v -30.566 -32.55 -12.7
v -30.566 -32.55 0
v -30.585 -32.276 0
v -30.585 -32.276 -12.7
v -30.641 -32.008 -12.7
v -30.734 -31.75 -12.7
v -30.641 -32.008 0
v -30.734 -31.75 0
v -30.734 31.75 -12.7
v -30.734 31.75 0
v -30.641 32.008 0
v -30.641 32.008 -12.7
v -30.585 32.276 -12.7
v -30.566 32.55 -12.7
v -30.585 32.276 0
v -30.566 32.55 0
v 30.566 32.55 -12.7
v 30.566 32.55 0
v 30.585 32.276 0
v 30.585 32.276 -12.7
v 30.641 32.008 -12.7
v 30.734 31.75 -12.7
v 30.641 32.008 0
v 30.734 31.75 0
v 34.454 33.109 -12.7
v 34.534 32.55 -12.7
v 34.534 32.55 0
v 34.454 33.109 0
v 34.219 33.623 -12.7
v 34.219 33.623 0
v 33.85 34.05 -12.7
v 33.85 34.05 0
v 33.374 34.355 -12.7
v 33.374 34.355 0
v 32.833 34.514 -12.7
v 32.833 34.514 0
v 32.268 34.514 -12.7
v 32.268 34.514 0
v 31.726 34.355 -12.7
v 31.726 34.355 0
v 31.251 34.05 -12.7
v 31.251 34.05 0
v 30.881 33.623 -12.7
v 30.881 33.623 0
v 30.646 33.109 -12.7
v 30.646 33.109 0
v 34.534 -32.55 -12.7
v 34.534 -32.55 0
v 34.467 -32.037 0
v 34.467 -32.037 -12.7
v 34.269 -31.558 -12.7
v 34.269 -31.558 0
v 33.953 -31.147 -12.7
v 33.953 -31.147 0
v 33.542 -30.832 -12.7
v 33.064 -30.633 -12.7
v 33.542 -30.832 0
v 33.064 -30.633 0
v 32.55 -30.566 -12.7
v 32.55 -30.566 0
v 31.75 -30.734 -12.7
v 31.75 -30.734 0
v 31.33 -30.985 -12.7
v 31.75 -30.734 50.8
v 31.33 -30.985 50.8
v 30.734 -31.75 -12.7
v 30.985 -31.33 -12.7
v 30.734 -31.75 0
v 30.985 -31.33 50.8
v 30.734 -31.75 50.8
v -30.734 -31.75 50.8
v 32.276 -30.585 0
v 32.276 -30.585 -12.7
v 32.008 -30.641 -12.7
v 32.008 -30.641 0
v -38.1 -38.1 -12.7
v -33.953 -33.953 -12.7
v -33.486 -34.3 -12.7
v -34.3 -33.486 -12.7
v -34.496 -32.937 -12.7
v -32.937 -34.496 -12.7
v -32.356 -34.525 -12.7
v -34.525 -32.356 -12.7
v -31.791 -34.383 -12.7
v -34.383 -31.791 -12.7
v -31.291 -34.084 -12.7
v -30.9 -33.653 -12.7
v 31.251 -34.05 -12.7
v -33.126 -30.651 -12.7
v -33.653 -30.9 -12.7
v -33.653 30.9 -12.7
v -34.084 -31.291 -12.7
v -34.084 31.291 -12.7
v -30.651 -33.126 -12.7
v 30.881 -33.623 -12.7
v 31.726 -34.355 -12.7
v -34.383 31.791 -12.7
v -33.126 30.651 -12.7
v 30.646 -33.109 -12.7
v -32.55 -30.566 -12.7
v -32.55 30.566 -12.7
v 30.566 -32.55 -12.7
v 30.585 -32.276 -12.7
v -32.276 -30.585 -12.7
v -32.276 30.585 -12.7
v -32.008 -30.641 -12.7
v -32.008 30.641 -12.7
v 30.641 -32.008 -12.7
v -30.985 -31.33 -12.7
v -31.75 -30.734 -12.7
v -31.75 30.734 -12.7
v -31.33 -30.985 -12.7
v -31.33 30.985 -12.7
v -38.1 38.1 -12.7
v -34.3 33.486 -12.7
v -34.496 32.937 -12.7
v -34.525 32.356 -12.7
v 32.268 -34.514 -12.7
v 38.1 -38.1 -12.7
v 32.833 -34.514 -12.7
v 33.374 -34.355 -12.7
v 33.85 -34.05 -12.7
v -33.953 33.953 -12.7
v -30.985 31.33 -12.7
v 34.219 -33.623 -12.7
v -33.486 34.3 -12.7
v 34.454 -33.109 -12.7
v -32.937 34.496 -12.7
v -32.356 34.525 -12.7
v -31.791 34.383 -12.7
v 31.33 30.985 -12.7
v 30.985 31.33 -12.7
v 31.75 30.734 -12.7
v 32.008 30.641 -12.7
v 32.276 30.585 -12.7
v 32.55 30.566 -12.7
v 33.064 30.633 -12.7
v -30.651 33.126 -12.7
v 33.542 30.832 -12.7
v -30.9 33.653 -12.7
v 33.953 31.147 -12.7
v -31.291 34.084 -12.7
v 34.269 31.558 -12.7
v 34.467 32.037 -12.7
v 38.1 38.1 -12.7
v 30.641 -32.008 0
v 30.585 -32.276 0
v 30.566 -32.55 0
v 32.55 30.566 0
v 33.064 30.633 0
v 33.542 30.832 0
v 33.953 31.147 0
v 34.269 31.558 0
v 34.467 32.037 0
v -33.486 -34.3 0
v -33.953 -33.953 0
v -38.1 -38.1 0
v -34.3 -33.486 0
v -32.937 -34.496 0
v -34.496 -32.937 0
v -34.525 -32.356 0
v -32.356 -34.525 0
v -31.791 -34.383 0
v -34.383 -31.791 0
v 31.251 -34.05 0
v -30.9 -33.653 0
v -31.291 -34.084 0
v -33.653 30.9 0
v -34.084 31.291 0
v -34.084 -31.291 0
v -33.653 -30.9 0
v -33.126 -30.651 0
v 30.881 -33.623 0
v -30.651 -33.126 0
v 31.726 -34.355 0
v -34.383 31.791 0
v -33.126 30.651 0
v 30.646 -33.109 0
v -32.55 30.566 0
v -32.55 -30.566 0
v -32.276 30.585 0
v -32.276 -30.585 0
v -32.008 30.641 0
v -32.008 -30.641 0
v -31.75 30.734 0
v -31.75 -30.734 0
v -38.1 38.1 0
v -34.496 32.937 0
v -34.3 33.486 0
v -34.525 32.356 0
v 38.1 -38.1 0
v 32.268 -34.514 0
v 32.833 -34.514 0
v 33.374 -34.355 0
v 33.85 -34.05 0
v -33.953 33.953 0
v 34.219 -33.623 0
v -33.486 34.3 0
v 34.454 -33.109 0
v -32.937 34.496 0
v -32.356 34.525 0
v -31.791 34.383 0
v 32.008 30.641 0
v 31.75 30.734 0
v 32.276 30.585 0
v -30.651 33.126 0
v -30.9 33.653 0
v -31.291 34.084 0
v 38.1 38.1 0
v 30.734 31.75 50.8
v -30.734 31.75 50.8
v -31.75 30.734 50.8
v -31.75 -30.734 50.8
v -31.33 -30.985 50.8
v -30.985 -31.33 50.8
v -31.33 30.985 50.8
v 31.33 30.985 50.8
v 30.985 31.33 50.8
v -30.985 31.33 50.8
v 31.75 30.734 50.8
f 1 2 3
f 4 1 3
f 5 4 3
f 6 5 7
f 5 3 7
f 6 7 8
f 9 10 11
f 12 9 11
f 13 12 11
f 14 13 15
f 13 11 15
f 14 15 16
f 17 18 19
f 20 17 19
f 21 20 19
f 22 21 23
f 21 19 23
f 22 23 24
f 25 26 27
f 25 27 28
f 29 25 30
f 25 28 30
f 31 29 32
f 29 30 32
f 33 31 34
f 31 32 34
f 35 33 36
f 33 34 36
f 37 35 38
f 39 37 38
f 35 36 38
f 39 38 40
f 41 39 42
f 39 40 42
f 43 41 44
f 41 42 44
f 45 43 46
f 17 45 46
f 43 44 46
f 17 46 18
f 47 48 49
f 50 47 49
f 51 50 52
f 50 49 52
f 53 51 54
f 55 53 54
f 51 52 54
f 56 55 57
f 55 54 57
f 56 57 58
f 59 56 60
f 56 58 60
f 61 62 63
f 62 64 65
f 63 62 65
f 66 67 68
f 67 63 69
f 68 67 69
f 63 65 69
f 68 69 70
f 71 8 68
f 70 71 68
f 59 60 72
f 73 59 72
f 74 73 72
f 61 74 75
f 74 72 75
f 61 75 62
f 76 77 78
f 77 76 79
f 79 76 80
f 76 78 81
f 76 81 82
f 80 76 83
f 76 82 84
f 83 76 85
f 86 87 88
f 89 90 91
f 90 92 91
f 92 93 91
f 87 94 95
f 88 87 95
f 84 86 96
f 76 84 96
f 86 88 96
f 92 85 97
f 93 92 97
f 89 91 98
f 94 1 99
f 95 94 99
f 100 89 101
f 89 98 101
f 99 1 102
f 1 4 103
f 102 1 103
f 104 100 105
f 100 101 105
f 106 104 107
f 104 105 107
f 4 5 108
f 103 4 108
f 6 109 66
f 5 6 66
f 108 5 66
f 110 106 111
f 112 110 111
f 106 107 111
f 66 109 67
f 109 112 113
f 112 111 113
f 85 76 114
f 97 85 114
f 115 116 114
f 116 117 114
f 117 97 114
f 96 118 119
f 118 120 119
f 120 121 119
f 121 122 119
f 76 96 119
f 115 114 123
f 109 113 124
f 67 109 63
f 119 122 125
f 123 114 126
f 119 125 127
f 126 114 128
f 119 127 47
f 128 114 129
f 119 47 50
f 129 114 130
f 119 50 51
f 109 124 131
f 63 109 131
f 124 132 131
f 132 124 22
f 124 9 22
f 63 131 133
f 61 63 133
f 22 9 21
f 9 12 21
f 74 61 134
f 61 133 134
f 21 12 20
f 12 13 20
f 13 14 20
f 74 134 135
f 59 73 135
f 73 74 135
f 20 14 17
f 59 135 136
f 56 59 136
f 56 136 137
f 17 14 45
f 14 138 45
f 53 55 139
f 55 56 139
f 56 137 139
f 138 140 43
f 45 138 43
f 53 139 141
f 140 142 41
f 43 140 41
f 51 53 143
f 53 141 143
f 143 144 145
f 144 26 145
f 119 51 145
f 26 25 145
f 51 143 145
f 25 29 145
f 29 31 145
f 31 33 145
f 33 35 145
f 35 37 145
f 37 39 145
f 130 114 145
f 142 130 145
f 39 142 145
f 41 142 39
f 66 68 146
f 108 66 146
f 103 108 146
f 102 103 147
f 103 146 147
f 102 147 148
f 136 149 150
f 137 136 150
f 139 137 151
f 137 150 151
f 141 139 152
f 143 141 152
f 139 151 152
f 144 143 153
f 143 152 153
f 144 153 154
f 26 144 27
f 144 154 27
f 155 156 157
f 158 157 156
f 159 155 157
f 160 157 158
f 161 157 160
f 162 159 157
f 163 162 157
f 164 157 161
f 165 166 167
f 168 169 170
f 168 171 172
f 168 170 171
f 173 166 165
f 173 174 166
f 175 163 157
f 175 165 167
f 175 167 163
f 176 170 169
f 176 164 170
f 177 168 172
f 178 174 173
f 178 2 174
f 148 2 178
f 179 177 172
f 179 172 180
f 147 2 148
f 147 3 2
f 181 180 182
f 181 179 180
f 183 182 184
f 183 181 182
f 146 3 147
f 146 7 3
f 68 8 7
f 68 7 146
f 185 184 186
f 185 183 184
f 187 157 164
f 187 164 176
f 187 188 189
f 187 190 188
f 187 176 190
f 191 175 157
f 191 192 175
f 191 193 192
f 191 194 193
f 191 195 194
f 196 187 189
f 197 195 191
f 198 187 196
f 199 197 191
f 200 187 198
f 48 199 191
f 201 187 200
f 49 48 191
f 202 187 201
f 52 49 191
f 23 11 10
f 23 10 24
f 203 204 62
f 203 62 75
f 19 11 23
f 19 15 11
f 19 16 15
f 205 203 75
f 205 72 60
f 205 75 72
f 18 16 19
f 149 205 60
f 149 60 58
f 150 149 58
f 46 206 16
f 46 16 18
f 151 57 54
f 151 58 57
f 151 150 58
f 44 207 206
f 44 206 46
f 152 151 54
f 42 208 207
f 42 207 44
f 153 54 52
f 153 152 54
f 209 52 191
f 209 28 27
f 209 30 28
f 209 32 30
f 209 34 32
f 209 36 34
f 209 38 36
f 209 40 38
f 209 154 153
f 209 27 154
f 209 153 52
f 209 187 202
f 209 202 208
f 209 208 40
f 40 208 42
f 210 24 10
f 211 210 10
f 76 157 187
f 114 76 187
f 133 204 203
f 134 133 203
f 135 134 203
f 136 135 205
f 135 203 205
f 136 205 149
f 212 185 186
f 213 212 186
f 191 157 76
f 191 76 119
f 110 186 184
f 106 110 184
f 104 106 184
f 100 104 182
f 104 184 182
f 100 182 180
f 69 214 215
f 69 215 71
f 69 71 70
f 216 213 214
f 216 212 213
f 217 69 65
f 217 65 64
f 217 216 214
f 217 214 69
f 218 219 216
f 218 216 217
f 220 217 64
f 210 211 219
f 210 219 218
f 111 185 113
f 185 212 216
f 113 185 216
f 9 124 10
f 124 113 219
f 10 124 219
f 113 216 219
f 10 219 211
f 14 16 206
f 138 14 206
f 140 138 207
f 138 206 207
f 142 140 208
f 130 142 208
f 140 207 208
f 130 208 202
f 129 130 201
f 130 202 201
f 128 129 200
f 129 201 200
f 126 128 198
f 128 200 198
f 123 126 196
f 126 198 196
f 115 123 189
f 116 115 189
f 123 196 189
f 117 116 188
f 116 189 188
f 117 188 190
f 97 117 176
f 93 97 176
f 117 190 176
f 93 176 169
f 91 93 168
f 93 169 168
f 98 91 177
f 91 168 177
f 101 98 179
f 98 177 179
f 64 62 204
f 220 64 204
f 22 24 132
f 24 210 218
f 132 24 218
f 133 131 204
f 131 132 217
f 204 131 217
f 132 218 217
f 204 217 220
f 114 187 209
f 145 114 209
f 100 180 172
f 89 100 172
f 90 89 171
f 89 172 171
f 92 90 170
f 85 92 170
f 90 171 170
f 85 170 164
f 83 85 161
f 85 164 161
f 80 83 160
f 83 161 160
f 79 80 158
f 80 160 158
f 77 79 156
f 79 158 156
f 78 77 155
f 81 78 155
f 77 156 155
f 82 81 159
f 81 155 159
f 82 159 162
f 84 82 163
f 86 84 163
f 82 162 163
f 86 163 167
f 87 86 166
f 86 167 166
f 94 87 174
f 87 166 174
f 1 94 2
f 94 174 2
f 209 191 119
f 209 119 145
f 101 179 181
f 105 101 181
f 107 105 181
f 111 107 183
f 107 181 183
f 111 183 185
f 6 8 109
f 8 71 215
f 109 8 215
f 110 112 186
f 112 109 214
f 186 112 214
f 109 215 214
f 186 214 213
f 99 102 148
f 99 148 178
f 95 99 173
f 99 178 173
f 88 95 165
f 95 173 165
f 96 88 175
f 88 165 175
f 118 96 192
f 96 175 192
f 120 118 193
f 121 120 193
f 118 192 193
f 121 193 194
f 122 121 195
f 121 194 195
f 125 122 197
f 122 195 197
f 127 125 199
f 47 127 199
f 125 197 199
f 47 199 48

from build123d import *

# Parameters (mm, degrees)
F0_W     = 76.2
F0_H     = 76.2
F1_DEPTH = 12.7
F2_DEPTH = 50.8
F3_DEPTH = 12.7


with BuildPart() as f1:
    # F0 (on Top) → F1 (new body)
    with BuildSketch(Plane.XY):
        Rectangle(F0_W, F0_H)
        with BuildLine():
            Line((30.565725, -32.5501), (-30.565725, -32.5501))
            ThreePointArc((-30.565725, -32.5501), (-33.9532650189, -33.9532650189), (-32.5501, -30.565725))
            Line((-32.5501, -30.565725), (-32.5501, 30.565725))
            ThreePointArc((-32.5501, 30.565725), (-33.9532650189, 33.9532650189), (-30.565725, 32.5501))
            Line((-30.565725, 32.5501), (30.565725, 32.5501))
            ThreePointArc((30.565725, 32.5501), (32.5501, 34.534475), (34.534475, 32.5501))
            ThreePointArc((34.534475, 32.5501), (33.9532650189, 31.1469349811), (32.5501, 30.565725))
            Line((32.5501, 30.565725), (32.5501, -30.565725))
            ThreePointArc((32.5501, -30.565725), (33.9532650189, -31.1469349811), (34.534475, -32.5501))
            ThreePointArc((34.534475, -32.5501), (32.5501, -34.534475), (30.565725, -32.5501))
        make_face(mode=Mode.SUBTRACT)
        with BuildLine():
            ThreePointArc((-31.75, -30.7341748554), (-31.1469349811, -31.1469349811), (-30.7341748554, -31.75))
            Line((-30.7341748554, -31.75), (30.7341748554, -31.75))
            ThreePointArc((30.7341748554, -31.75), (31.1469349811, -31.1469349811), (31.75, -30.7341748554))
            Line((31.75, -30.7341748554), (31.75, 30.7341748554))
            ThreePointArc((31.75, 30.7341748554), (31.1469349811, 31.1469349811), (30.7341748554, 31.75))
            Line((30.7341748554, 31.75), (-30.7341748554, 31.75))
            ThreePointArc((-30.7341748554, 31.75), (-31.1469349811, 31.1469349811), (-31.75, 30.7341748554))
            Line((-31.75, 30.7341748554), (-31.75, -30.7341748554))
        make_face()
        with BuildLine():
            ThreePointArc((31.75, -30.7341748554), (32.1412799406, -30.6082940623), (32.5501, -30.565725))
            Line((32.5501, -30.565725), (32.5501, 30.565725))
            ThreePointArc((32.5501, 30.565725), (32.1412799406, 30.6082940623), (31.75, 30.7341748554))
            Line((31.75, 30.7341748554), (31.75, -30.7341748554))
        make_face()
        with BuildLine():
            ThreePointArc((-30.7341748554, -31.75), (-30.6082940623, -32.1412799406), (-30.565725, -32.5501))
            Line((-30.565725, -32.5501), (30.565725, -32.5501))
            ThreePointArc((30.565725, -32.5501), (30.6082940623, -32.1412799406), (30.7341748554, -31.75))
            Line((30.7341748554, -31.75), (-30.7341748554, -31.75))
        make_face()
        with BuildLine():
            Line((30.565725, 32.5501), (-30.565725, 32.5501))
            ThreePointArc((-30.565725, 32.5501), (-30.6082940623, 32.1412799406), (-30.7341748554, 31.75))
            Line((-30.7341748554, 31.75), (30.7341748554, 31.75))
            ThreePointArc((30.7341748554, 31.75), (30.6082940623, 32.1412799406), (30.565725, 32.5501))
        make_face()
        with BuildLine():
            Line((-32.5501, 30.565725), (-32.5501, -30.565725))
            ThreePointArc((-32.5501, -30.565725), (-32.1412799406, -30.6082940623), (-31.75, -30.7341748554))
            Line((-31.75, -30.7341748554), (-31.75, 30.7341748554))
            ThreePointArc((-31.75, 30.7341748554), (-32.1412799406, 30.6082940623), (-32.5501, 30.565725))
        make_face()
        with BuildLine():
            ThreePointArc((-32.5501, -30.565725), (-33.9532650189, -33.9532650189), (-30.565725, -32.5501))
            Line((-30.565725, -32.5501), (-32.5501, -32.5501))
            Line((-32.5501, -32.5501), (-32.5501, -30.565725))
        make_face()
        with BuildLine():
            Line((32.5501, 32.5501), (32.5501, 30.565725))
            ThreePointArc((32.5501, 30.565725), (33.9532650189, 31.1469349811), (34.534475, 32.5501))
            ThreePointArc((34.534475, 32.5501), (32.5501, 34.534475), (30.565725, 32.5501))
            Line((30.565725, 32.5501), (32.5501, 32.5501))
        make_face()
        with BuildLine():
            ThreePointArc((-30.565725, 32.5501), (-33.9532650189, 33.9532650189), (-32.5501, 30.565725))
            Line((-32.5501, 30.565725), (-32.5501, 32.5501))
            Line((-32.5501, 32.5501), (-30.565725, 32.5501))
        make_face()
        with BuildLine():
            Line((32.5501, -32.5501), (30.565725, -32.5501))
            ThreePointArc((30.565725, -32.5501), (32.5501, -34.534475), (34.534475, -32.5501))
            ThreePointArc((34.534475, -32.5501), (33.9532650189, -31.1469349811), (32.5501, -30.565725))
            Line((32.5501, -30.565725), (32.5501, -32.5501))
        make_face()
        with BuildLine():
            ThreePointArc((31.75, 30.7341748554), (32.1412799406, 30.6082940623), (32.5501, 30.565725))
            Line((32.5501, 30.565725), (32.5501, 32.5501))
            Line((32.5501, 32.5501), (30.565725, 32.5501))
            ThreePointArc((30.565725, 32.5501), (30.6082940623, 32.1412799406), (30.7341748554, 31.75))
            Line((30.7341748554, 31.75), (31.75, 31.75))
            Line((31.75, 31.75), (31.75, 30.7341748554))
        make_face()
        with BuildLine():
            Line((-32.5501, -32.5501), (-30.565725, -32.5501))
            ThreePointArc((-30.565725, -32.5501), (-30.6082940623, -32.1412799406), (-30.7341748554, -31.75))
            Line((-30.7341748554, -31.75), (-31.75, -31.75))
            Line((-31.75, -31.75), (-31.75, -30.7341748554))
            ThreePointArc((-31.75, -30.7341748554), (-32.1412799406, -30.6082940623), (-32.5501, -30.565725))
            Line((-32.5501, -30.565725), (-32.5501, -32.5501))
        make_face()
        with BuildLine():
            Line((-31.75, 31.75), (-31.75, 30.7341748554))
            ThreePointArc((-31.75, 30.7341748554), (-31.1469349811, 31.1469349811), (-30.7341748554, 31.75))
            Line((-30.7341748554, 31.75), (-31.75, 31.75))
        make_face()
        with BuildLine():
            ThreePointArc((30.7341748554, -31.75), (30.6082940623, -32.1412799406), (30.565725, -32.5501))
            Line((30.565725, -32.5501), (32.5501, -32.5501))
            Line((32.5501, -32.5501), (32.5501, -30.565725))
            ThreePointArc((32.5501, -30.565725), (32.1412799406, -30.6082940623), (31.75, -30.7341748554))
            Line((31.75, -30.7341748554), (31.75, -31.75))
            Line((31.75, -31.75), (30.7341748554, -31.75))
        make_face()
        with BuildLine():
            ThreePointArc((30.7341748554, 31.75), (31.1469349811, 31.1469349811), (31.75, 30.7341748554))
            Line((31.75, 30.7341748554), (31.75, 31.75))
            Line((31.75, 31.75), (30.7341748554, 31.75))
        make_face()
        with BuildLine():
            Line((-31.75, -31.75), (-30.7341748554, -31.75))
            ThreePointArc((-30.7341748554, -31.75), (-31.1469349811, -31.1469349811), (-31.75, -30.7341748554))
            Line((-31.75, -30.7341748554), (-31.75, -31.75))
        make_face()
        with BuildLine():
            ThreePointArc((31.75, -30.7341748554), (31.1469349811, -31.1469349811), (30.7341748554, -31.75))
            Line((30.7341748554, -31.75), (31.75, -31.75))
            Line((31.75, -31.75), (31.75, -30.7341748554))
        make_face()
        with BuildLine():
            Line((-32.5501, 32.5501), (-32.5501, 30.565725))
            ThreePointArc((-32.5501, 30.565725), (-32.1412799406, 30.6082940623), (-31.75, 30.7341748554))
            Line((-31.75, 30.7341748554), (-31.75, 31.75))
            Line((-31.75, 31.75), (-30.7341748554, 31.75))
            ThreePointArc((-30.7341748554, 31.75), (-30.6082940623, 32.1412799406), (-30.565725, 32.5501))
            Line((-30.565725, 32.5501), (-32.5501, 32.5501))
        make_face()
    extrude(amount=-F1_DEPTH)

    # F0 (on Top) → F2 (join)
    with BuildSketch(Plane.XY):
        with BuildLine():
            ThreePointArc((-31.75, -30.7341748554), (-31.1469349811, -31.1469349811), (-30.7341748554, -31.75))
            Line((-30.7341748554, -31.75), (30.7341748554, -31.75))
            ThreePointArc((30.7341748554, -31.75), (31.1469349811, -31.1469349811), (31.75, -30.7341748554))
            Line((31.75, -30.7341748554), (31.75, 30.7341748554))
            ThreePointArc((31.75, 30.7341748554), (31.1469349811, 31.1469349811), (30.7341748554, 31.75))
            Line((30.7341748554, 31.75), (-30.7341748554, 31.75))
            ThreePointArc((-30.7341748554, 31.75), (-31.1469349811, 31.1469349811), (-31.75, 30.7341748554))
            Line((-31.75, 30.7341748554), (-31.75, -30.7341748554))
        make_face()
    extrude(amount=F2_DEPTH)

    # F0 (on Top) → F3 (cut, through all)
    with BuildSketch(Plane.XY):
        with BuildLine():
            ThreePointArc((-32.5501, -30.565725), (-33.9532650189, -33.9532650189), (-30.565725, -32.5501))
            Line((-30.565725, -32.5501), (-32.5501, -32.5501))
            Line((-32.5501, -32.5501), (-32.5501, -30.565725))
        make_face()
        with BuildLine():
            Line((-32.5501, -32.5501), (-30.565725, -32.5501))
            ThreePointArc((-30.565725, -32.5501), (-30.6082940623, -32.1412799406), (-30.7341748554, -31.75))
            Line((-30.7341748554, -31.75), (-31.75, -31.75))
            Line((-31.75, -31.75), (-31.75, -30.7341748554))
            ThreePointArc((-31.75, -30.7341748554), (-32.1412799406, -30.6082940623), (-32.5501, -30.565725))
            Line((-32.5501, -30.565725), (-32.5501, -32.5501))
        make_face()
        with BuildLine():
            Line((-31.75, -31.75), (-30.7341748554, -31.75))
            ThreePointArc((-30.7341748554, -31.75), (-31.1469349811, -31.1469349811), (-31.75, -30.7341748554))
            Line((-31.75, -30.7341748554), (-31.75, -31.75))
        make_face()
        with BuildLine():
            Line((32.5501, -32.5501), (30.565725, -32.5501))
            ThreePointArc((30.565725, -32.5501), (32.5501, -34.534475), (34.534475, -32.5501))
            ThreePointArc((34.534475, -32.5501), (33.9532650189, -31.1469349811), (32.5501, -30.565725))
            Line((32.5501, -30.565725), (32.5501, -32.5501))
        make_face()
        with BuildLine():
            ThreePointArc((30.7341748554, -31.75), (30.6082940623, -32.1412799406), (30.565725, -32.5501))
            Line((30.565725, -32.5501), (32.5501, -32.5501))
            Line((32.5501, -32.5501), (32.5501, -30.565725))
            ThreePointArc((32.5501, -30.565725), (32.1412799406, -30.6082940623), (31.75, -30.7341748554))
            Line((31.75, -30.7341748554), (31.75, -31.75))
            Line((31.75, -31.75), (30.7341748554, -31.75))
        make_face()
        with BuildLine():
            ThreePointArc((31.75, -30.7341748554), (31.1469349811, -31.1469349811), (30.7341748554, -31.75))
            Line((30.7341748554, -31.75), (31.75, -31.75))
            Line((31.75, -31.75), (31.75, -30.7341748554))
        make_face()
        with BuildLine():
            ThreePointArc((30.7341748554, 31.75), (31.1469349811, 31.1469349811), (31.75, 30.7341748554))
            Line((31.75, 30.7341748554), (31.75, 31.75))
            Line((31.75, 31.75), (30.7341748554, 31.75))
        make_face()
        with BuildLine():
            ThreePointArc((31.75, 30.7341748554), (32.1412799406, 30.6082940623), (32.5501, 30.565725))
            Line((32.5501, 30.565725), (32.5501, 32.5501))
            Line((32.5501, 32.5501), (30.565725, 32.5501))
            ThreePointArc((30.565725, 32.5501), (30.6082940623, 32.1412799406), (30.7341748554, 31.75))
            Line((30.7341748554, 31.75), (31.75, 31.75))
            Line((31.75, 31.75), (31.75, 30.7341748554))
        make_face()
        with BuildLine():
            Line((32.5501, 32.5501), (32.5501, 30.565725))
            ThreePointArc((32.5501, 30.565725), (33.9532650189, 31.1469349811), (34.534475, 32.5501))
            ThreePointArc((34.534475, 32.5501), (32.5501, 34.534475), (30.565725, 32.5501))
            Line((30.565725, 32.5501), (32.5501, 32.5501))
        make_face()
        with BuildLine():
            ThreePointArc((-30.565725, 32.5501), (-33.9532650189, 33.9532650189), (-32.5501, 30.565725))
            Line((-32.5501, 30.565725), (-32.5501, 32.5501))
            Line((-32.5501, 32.5501), (-30.565725, 32.5501))
        make_face()
        with BuildLine():
            Line((-32.5501, 32.5501), (-32.5501, 30.565725))
            ThreePointArc((-32.5501, 30.565725), (-32.1412799406, 30.6082940623), (-31.75, 30.7341748554))
            Line((-31.75, 30.7341748554), (-31.75, 31.75))
            Line((-31.75, 31.75), (-30.7341748554, 31.75))
            ThreePointArc((-30.7341748554, 31.75), (-30.6082940623, 32.1412799406), (-30.565725, 32.5501))
            Line((-30.565725, 32.5501), (-32.5501, 32.5501))
        make_face()
        with BuildLine():
            Line((-31.75, 31.75), (-31.75, 30.7341748554))
            ThreePointArc((-31.75, 30.7341748554), (-31.1469349811, 31.1469349811), (-30.7341748554, 31.75))
            Line((-30.7341748554, 31.75), (-31.75, 31.75))
        make_face()
    extrude(amount=-F3_DEPTH, mode=Mode.SUBTRACT)


solid = f1.part
